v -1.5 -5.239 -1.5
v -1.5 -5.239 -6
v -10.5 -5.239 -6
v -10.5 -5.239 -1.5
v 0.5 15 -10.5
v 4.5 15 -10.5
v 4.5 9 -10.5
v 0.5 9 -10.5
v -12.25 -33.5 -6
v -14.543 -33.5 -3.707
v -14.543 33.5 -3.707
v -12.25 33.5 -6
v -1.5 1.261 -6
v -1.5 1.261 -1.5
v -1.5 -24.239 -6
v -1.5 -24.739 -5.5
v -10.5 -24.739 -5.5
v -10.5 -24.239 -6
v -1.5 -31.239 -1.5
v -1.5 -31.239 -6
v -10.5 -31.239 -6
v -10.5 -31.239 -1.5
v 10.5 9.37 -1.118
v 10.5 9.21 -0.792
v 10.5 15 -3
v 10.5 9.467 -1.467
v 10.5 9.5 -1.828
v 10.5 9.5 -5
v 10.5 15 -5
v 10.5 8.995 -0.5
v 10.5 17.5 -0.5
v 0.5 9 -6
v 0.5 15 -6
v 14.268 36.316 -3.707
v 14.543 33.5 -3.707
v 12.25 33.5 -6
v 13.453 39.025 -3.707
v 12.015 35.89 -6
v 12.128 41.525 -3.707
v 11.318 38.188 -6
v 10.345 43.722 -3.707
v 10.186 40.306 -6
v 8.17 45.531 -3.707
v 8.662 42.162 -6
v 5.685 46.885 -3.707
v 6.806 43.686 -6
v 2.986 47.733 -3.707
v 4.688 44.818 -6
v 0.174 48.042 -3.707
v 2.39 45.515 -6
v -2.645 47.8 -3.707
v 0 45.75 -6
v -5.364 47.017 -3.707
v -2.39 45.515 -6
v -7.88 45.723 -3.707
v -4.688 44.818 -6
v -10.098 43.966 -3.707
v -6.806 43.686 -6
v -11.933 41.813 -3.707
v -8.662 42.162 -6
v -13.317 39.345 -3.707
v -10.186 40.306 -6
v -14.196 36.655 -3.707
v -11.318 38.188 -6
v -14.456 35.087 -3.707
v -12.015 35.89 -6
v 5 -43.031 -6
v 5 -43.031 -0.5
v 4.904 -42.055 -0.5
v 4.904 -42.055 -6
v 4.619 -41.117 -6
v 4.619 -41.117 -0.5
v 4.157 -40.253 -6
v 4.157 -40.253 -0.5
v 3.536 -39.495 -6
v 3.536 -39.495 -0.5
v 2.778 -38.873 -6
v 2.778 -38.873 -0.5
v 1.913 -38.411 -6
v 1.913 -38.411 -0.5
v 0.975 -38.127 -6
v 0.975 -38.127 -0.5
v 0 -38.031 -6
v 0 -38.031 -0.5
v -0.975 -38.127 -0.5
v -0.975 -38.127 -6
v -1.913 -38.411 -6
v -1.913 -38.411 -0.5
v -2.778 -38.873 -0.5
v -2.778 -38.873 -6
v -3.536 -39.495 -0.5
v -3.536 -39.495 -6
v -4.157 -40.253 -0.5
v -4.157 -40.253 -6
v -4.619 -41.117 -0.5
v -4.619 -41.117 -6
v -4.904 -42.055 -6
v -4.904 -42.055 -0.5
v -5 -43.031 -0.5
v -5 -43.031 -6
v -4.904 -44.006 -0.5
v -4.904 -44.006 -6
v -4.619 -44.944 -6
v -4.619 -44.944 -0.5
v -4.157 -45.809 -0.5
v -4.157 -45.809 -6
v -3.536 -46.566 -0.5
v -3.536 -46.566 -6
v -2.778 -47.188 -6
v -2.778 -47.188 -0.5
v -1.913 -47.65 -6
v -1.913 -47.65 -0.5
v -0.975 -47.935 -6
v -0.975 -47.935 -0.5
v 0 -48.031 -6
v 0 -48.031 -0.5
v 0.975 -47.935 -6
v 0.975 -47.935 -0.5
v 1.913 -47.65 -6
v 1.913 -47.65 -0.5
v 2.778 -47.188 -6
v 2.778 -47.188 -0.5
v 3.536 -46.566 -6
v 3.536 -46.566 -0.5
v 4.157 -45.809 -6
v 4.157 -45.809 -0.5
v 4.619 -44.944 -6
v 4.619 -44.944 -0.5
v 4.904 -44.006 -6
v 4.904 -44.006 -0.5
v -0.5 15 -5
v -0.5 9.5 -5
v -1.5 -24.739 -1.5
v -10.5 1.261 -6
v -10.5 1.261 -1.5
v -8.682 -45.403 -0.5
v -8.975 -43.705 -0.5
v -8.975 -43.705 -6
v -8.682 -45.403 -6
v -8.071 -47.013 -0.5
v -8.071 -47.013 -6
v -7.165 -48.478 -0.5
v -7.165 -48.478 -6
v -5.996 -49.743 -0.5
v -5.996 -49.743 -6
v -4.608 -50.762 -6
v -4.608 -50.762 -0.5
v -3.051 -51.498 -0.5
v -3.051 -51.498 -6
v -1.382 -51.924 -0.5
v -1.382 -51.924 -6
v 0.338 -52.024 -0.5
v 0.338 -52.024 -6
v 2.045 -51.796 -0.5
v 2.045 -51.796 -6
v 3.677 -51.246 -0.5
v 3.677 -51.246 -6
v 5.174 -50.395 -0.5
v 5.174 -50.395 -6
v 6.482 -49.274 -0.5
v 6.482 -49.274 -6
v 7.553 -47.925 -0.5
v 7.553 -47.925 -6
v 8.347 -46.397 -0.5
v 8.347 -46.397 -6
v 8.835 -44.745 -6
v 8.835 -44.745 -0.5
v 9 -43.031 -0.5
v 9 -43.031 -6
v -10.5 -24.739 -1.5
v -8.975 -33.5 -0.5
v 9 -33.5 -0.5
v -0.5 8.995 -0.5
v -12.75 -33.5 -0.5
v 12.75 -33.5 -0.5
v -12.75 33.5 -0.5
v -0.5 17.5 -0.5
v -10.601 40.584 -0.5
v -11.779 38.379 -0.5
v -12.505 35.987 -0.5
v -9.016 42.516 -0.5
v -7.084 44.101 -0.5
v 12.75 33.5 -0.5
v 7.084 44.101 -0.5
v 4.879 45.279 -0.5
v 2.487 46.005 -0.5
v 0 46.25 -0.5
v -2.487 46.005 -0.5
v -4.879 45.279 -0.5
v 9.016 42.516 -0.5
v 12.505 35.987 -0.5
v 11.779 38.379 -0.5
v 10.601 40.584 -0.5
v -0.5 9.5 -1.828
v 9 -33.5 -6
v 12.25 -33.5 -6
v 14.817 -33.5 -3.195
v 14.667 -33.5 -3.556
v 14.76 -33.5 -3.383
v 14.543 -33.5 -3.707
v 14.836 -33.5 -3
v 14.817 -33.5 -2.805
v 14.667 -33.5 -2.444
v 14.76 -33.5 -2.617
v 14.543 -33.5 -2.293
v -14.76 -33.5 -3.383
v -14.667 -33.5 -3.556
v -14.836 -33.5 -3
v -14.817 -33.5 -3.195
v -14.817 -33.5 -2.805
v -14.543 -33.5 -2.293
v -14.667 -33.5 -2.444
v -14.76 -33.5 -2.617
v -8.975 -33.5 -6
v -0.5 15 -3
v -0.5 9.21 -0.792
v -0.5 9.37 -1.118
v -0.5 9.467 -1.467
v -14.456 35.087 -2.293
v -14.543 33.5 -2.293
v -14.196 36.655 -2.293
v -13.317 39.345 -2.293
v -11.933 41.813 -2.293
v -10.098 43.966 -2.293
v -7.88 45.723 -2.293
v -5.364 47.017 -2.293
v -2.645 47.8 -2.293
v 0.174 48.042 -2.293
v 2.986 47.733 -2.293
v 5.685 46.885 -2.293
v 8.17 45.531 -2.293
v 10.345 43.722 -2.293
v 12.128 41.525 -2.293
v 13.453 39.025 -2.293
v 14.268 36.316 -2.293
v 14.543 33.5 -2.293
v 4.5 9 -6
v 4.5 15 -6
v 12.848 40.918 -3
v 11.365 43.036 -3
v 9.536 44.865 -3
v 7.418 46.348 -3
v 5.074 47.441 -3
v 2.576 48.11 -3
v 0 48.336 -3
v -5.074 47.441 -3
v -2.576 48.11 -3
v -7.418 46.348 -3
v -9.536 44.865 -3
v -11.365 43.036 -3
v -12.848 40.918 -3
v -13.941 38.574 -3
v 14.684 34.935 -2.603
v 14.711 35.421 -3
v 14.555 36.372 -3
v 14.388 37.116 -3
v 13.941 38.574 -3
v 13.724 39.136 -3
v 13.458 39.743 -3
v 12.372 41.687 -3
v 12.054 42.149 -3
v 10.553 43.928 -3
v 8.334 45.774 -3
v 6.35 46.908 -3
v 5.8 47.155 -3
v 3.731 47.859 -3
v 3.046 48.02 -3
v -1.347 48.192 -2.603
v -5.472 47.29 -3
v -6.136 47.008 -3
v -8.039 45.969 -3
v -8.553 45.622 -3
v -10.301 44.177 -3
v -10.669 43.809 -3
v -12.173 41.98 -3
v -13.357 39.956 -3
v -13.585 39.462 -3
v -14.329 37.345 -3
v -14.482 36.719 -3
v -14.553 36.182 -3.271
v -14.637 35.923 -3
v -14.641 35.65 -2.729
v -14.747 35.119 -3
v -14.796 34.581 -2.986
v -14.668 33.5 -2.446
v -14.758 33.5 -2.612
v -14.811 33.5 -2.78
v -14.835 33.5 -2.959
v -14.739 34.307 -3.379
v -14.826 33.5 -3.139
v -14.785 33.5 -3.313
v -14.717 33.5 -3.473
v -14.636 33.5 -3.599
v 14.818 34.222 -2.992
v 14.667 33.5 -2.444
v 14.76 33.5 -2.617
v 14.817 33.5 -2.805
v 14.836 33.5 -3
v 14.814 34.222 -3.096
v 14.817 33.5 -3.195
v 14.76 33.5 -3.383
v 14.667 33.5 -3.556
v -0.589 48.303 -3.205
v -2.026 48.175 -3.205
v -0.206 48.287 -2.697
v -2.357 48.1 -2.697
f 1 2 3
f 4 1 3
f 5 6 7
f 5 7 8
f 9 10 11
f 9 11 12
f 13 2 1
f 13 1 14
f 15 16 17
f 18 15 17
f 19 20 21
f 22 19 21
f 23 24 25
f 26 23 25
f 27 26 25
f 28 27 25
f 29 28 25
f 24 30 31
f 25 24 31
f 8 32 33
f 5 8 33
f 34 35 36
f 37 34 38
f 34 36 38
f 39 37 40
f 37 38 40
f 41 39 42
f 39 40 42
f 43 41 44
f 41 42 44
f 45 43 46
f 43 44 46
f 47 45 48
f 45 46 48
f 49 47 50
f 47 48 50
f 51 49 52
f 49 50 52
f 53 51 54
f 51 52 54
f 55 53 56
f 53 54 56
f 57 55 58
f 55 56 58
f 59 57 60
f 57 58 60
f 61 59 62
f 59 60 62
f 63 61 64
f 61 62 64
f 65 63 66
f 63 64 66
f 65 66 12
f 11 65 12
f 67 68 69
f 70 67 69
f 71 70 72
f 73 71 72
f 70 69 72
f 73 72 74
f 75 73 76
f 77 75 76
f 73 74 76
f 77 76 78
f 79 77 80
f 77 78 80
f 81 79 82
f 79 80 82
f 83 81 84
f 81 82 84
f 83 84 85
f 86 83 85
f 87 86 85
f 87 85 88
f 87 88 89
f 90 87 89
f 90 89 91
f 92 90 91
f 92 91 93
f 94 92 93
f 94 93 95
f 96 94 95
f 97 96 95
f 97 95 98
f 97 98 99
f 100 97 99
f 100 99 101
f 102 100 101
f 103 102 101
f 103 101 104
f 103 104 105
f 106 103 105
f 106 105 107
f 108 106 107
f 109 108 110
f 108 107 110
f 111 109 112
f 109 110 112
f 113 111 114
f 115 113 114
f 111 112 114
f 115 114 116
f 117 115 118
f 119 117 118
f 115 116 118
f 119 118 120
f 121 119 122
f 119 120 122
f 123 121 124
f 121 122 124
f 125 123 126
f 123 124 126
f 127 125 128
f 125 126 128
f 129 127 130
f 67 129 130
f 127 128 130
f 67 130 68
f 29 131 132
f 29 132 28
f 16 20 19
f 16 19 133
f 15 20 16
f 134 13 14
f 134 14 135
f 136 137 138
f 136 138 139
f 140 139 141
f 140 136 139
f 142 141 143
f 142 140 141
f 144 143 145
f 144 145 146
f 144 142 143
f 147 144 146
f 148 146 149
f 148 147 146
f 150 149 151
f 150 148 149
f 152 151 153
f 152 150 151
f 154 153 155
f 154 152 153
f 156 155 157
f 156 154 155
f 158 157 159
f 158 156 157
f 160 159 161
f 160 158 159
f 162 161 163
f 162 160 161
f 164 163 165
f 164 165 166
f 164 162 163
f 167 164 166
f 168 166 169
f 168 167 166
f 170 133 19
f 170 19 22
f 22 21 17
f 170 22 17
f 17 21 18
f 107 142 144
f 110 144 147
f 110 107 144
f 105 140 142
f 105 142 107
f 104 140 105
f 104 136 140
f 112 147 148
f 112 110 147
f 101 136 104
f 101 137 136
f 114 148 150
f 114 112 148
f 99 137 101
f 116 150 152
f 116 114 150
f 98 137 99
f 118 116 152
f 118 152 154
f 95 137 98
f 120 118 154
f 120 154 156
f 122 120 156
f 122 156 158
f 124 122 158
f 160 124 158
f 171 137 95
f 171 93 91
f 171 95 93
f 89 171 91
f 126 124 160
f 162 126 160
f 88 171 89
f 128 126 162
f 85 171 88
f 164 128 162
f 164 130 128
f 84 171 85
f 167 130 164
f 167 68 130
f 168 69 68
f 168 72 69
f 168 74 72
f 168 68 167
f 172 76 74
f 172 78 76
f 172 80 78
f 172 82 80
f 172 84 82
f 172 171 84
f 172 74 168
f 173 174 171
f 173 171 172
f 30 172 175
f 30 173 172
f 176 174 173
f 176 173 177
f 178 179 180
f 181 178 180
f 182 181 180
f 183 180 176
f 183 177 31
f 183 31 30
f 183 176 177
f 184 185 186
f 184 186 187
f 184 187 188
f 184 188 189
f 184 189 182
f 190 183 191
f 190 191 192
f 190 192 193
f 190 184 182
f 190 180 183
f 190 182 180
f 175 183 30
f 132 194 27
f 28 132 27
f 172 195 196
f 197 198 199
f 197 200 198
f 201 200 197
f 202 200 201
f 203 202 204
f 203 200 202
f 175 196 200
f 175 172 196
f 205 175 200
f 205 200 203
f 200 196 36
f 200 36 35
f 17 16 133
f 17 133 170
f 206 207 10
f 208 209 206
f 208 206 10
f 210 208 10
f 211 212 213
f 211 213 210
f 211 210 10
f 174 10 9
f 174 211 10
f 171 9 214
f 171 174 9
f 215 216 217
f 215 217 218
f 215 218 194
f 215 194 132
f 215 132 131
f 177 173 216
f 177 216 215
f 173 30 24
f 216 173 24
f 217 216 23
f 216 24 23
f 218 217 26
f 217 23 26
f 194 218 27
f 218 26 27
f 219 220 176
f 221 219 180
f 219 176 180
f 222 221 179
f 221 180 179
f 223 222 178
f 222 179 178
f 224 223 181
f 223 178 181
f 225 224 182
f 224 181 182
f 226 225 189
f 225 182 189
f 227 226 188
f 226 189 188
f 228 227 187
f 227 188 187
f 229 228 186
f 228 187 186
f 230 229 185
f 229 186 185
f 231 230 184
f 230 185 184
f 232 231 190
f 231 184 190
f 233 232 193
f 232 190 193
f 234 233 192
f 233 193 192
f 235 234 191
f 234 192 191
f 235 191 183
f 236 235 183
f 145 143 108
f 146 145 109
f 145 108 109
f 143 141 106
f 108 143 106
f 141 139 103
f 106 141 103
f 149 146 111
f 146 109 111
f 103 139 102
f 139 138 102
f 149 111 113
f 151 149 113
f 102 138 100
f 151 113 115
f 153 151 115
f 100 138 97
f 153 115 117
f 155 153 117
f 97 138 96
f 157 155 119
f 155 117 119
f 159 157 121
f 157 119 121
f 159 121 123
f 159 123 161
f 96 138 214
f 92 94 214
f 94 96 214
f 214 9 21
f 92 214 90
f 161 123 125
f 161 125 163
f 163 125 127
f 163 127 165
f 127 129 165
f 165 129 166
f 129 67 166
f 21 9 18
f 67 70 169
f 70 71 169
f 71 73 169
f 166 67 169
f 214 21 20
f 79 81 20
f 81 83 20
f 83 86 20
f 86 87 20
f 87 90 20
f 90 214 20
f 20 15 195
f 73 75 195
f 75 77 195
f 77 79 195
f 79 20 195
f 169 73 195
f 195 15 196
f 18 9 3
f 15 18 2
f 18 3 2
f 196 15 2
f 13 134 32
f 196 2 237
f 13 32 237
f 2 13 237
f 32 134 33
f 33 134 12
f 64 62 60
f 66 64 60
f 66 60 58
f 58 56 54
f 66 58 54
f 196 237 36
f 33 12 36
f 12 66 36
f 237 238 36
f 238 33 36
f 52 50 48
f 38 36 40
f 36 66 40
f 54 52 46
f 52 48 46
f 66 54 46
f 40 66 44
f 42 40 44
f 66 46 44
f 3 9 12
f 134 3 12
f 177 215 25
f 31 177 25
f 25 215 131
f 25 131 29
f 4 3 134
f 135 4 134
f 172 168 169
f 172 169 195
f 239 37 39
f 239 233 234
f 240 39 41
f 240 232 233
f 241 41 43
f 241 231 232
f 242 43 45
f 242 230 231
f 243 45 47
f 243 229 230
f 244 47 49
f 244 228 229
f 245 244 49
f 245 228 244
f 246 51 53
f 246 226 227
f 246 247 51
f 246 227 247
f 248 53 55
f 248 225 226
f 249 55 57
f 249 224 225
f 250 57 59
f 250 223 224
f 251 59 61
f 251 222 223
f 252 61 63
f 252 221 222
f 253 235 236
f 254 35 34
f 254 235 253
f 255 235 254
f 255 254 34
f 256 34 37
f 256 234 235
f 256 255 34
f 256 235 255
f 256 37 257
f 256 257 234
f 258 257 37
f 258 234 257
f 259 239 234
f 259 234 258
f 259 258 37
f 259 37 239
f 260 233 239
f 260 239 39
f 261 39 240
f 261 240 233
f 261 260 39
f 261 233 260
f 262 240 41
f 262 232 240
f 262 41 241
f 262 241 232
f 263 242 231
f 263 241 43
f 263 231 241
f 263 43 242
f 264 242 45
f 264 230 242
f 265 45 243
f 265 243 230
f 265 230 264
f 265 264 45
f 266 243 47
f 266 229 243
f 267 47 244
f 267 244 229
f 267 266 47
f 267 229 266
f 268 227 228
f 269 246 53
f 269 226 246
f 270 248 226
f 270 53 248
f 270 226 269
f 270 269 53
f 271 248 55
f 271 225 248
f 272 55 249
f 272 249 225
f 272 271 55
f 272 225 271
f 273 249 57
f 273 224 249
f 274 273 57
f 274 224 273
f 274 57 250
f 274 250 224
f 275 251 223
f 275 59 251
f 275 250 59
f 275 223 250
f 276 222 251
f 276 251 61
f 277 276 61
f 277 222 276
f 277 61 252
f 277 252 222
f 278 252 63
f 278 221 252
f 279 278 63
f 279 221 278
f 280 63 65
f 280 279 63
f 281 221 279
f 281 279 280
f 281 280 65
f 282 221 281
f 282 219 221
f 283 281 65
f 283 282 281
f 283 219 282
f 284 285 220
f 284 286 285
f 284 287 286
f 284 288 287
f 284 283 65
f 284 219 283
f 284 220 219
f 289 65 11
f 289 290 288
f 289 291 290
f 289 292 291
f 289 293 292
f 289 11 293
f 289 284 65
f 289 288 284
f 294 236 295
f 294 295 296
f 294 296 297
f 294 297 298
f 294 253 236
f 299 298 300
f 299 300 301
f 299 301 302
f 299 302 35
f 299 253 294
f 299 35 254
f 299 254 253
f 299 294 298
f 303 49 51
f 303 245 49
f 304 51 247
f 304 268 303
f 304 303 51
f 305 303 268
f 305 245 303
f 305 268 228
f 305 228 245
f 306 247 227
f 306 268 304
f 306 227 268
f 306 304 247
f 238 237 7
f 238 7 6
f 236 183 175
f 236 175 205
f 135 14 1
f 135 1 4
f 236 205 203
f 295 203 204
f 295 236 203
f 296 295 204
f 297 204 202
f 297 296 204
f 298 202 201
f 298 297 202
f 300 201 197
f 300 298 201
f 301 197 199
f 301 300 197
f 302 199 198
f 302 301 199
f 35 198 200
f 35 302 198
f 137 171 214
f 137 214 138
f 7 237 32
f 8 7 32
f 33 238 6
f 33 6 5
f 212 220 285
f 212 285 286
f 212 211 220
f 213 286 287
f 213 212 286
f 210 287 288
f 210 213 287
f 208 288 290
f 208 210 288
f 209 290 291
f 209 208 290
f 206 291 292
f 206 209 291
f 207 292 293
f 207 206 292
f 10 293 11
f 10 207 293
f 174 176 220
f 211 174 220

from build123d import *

# Parameters (mm, degrees)
DODANIE_WYCI_GNI_CIE1_DEPTH = 6
SFAZOWANIE1_SIZE            = 3.5
ZAOKR_GLENIE1_R             = 1
SZKIC2_W                    = 11
SZKIC2_H                    = 5.5
WYTNIJ_WYCI_GNI_CIE1_DEPTH  = 5
SZKIC3_W                    = 9
SZKIC3_H                    = 6.5
WYTNIJ_WYCI_GNI_CIE2_DEPTH  = 4.5
SFAZOWANIE2_SIZE            = 0.5
SZKIC4_R                    = 5
DODANIE_WYCI_GNI_CIE2_DEPTH = 6
SZKIC5_W                    = 4
SZKIC5_H                    = 6
DODANIE_WYCI_GNI_CIE3_DEPTH = 4.5
SFAZOWANIE3_SIZE            = 3
SFAZOWANIE4_SIZE            = 1
ZAOKR_GLENIE2_R             = 2
SZKIC6_W                    = 43.68114346
SZKIC6_H                    = 110.382920914
WYTNIJ_WYCI_GNI_CIE3_DEPTH  = 0.5


with BuildPart() as part:
    # Szkic1 → Dodanie-wyciągnięcie1 (new body)
    with BuildSketch(Plane.XY):
        with BuildLine():
            ThreePointArc((15.75, 33.5), (0, 49.25), (-15.75, 33.5))
            Line((-15.75, 33.5), (15.75, 33.5))
        make_face()
        with BuildLine():
            Line((15.75, 33.5), (-15.75, 33.5))
            ThreePointArc((-15.75, 33.5), (0, 17.75), (15.75, 33.5))
        make_face()
        with BuildLine():
            ThreePointArc((15.75, 33.5), (0, 17.75), (-15.75, 33.5))
            Line((-15.75, 33.5), (-15.75, -33.5))
            Line((-15.75, -33.5), (15.75, -33.5))
            Line((15.75, -33.5), (15.75, 33.5))
        make_face()
    extrude(amount=-DODANIE_WYCI_GNI_CIE1_DEPTH)

    # Sfazowanie1
    # the kernel refuses this chamfer: 3.5 mm, written as the material it takes off along each edge
    with BuildSketch(Plane(origin=(15.75, -42.500890458, 0), x_dir=(-0.9996219169112968, 0, 0.02749587661058637), z_dir=(0, 1, 0)), Plane(origin=(-15.75, 33.5, 0), x_dir=(0.9996219169112968, 0, 0.02749587661058637), z_dir=(0, -1, 0)), Plane(origin=(-15.75, 33.5, -6), x_dir=(-0.02749587661058661, 0, 0.9996219169112968), z_dir=(0, -1, 0))) as sfazowanie1_piece_1:
        Polygon((SFAZOWANIE1_SIZE * 0.999621916911, -SFAZOWANIE1_SIZE * 0.0274958766106), (-SFAZOWANIE1_SIZE * 0.0274958766106, -SFAZOWANIE1_SIZE * 0.999621916911), (0, 0), align=None)
    extrude(amount=76.000890458, mode=Mode.SUBTRACT)
    with BuildSketch(Plane(origin=(15.75, -42.500890458, -6), x_dir=(-0.9996219169112968, 0, -0.027495876610586358), z_dir=(0, 1, 0))) as sfazowanie1_piece_2:
        Polygon((SFAZOWANIE1_SIZE * 0.999621916911, SFAZOWANIE1_SIZE * 0.0274958766106), (-SFAZOWANIE1_SIZE * 0.0274958766106, SFAZOWANIE1_SIZE * 0.999621916911), (0, 0), align=None)
    extrude(amount=76.000890458, mode=Mode.SUBTRACT)
    with BuildSketch(Plane(origin=(0, 33.5, 0), x_dir=(-1, 0, 0), z_dir=(0, -1, 0))) as sfazowanie1_piece_3:
        Polygon((15.75, SFAZOWANIE1_SIZE), (15.75 - SFAZOWANIE1_SIZE, 0), (15.75, 0), align=None)
    revolve(axis=Axis((0, 33.5, 0), (0, 0, -1)), revolution_arc=180, mode=Mode.SUBTRACT)
    with BuildSketch(Plane(origin=(0, 33.5, -6), x_dir=(1, 0, 0), z_dir=(0, -1, 0))) as sfazowanie1_piece_4:
        Polygon((15.75, SFAZOWANIE1_SIZE), (15.75 - SFAZOWANIE1_SIZE, 0), (15.75, 0), align=None)
    revolve(axis=Axis((0, 33.5, -6), (0, 0, 1)), revolution_arc=180, mode=Mode.SUBTRACT)

    # Zaokrąglenie1
    zaokr_glenie1_edges = [part.edges().sort_by_distance(p)[0] for p in [
        (-15.25, 0, -3),
        (0, 48.75, -3),
        (15.25, 0, -3),
    ]]
    fillet(zaokr_glenie1_edges, radius=ZAOKR_GLENIE1_R)

    # Szkic2 → Wytnij-wyciągnięcie1 (cut)
    with BuildSketch(Plane.XY):
        with Locations((5, 12.25)):
            Rectangle(SZKIC2_W, SZKIC2_H)
    extrude(amount=-WYTNIJ_WYCI_GNI_CIE1_DEPTH, mode=Mode.SUBTRACT)

    # Szkic3 → Wytnij-wyciągnięcie2 (cut)
    with BuildSketch(Plane(origin=(0, 0, -6), x_dir=(-1, 0, 0), z_dir=(0, 0, -1))):
        with Locations((6, -1.988867336)):
            Rectangle(SZKIC3_W, SZKIC3_H)
        with Locations((6, -27.988867336)):
            Rectangle(SZKIC3_W, SZKIC3_H)
    extrude(amount=-WYTNIJ_WYCI_GNI_CIE2_DEPTH, mode=Mode.SUBTRACT)

    # Sfazowanie2
    sfazowanie2_edges = [part.edges().sort_by_distance(p)[0] for p in [
        (-6, -24.738867336, -6),
    ]]
    chamfer(sfazowanie2_edges, length=SFAZOWANIE2_SIZE)

    # Szkic4 → Dodanie-wyciągnięcie2 (add)
    with BuildSketch(Plane.XY):
        with BuildLine():
            Line((9, -33.5), (-8.974684649, -33.5))
            Line((-8.974684649, -33.5), (-8.974684649, -43.705386779))
            ThreePointArc((-8.974684649, -43.705386779), (0.337519003, -52.024492564), (9, -43.030823629))
            Line((9, -43.030823629), (9, -33.5))
        make_face()
        with Locations((0, -43.030823629)):
            Circle(SZKIC4_R, mode=Mode.SUBTRACT)
    extrude(amount=-DODANIE_WYCI_GNI_CIE2_DEPTH)

    # Szkic5 → Dodanie-wyciągnięcie3 (add)
    with BuildSketch(Plane(origin=(0, 0, -6), x_dir=(-1, 0, 0), z_dir=(0, 0, -1))):
        with Locations((-2.5, 12)):
            Rectangle(SZKIC5_W, SZKIC5_H)
    extrude(amount=DODANIE_WYCI_GNI_CIE3_DEPTH)

    # Sfazowanie3
    sfazowanie3_edges = [part.edges().sort_by_distance(p)[0] for p in [
        (5, 15, 0),
    ]]
    chamfer(sfazowanie3_edges, length=SFAZOWANIE3_SIZE)

    # Sfazowanie4
    sfazowanie4_edges = [part.edges().sort_by_distance(p)[0] for p in [
        (5, 9.5, 0),
    ]]
    chamfer(sfazowanie4_edges, length=SFAZOWANIE4_SIZE)

    # Zaokrąglenie2
    zaokr_glenie2_edges = [part.edges().sort_by_distance(p)[0] for p in [
        (5, 9.5, -1),
    ]]
    fillet(zaokr_glenie2_edges, radius=ZAOKR_GLENIE2_R)

    # Szkic6 → Wytnij-wyciągnięcie3 (cut)
    with BuildSketch(Plane.XY):
        Rectangle(SZKIC6_W, SZKIC6_H)
    extrude(amount=-WYTNIJ_WYCI_GNI_CIE3_DEPTH, mode=Mode.SUBTRACT)


solid = part.part
